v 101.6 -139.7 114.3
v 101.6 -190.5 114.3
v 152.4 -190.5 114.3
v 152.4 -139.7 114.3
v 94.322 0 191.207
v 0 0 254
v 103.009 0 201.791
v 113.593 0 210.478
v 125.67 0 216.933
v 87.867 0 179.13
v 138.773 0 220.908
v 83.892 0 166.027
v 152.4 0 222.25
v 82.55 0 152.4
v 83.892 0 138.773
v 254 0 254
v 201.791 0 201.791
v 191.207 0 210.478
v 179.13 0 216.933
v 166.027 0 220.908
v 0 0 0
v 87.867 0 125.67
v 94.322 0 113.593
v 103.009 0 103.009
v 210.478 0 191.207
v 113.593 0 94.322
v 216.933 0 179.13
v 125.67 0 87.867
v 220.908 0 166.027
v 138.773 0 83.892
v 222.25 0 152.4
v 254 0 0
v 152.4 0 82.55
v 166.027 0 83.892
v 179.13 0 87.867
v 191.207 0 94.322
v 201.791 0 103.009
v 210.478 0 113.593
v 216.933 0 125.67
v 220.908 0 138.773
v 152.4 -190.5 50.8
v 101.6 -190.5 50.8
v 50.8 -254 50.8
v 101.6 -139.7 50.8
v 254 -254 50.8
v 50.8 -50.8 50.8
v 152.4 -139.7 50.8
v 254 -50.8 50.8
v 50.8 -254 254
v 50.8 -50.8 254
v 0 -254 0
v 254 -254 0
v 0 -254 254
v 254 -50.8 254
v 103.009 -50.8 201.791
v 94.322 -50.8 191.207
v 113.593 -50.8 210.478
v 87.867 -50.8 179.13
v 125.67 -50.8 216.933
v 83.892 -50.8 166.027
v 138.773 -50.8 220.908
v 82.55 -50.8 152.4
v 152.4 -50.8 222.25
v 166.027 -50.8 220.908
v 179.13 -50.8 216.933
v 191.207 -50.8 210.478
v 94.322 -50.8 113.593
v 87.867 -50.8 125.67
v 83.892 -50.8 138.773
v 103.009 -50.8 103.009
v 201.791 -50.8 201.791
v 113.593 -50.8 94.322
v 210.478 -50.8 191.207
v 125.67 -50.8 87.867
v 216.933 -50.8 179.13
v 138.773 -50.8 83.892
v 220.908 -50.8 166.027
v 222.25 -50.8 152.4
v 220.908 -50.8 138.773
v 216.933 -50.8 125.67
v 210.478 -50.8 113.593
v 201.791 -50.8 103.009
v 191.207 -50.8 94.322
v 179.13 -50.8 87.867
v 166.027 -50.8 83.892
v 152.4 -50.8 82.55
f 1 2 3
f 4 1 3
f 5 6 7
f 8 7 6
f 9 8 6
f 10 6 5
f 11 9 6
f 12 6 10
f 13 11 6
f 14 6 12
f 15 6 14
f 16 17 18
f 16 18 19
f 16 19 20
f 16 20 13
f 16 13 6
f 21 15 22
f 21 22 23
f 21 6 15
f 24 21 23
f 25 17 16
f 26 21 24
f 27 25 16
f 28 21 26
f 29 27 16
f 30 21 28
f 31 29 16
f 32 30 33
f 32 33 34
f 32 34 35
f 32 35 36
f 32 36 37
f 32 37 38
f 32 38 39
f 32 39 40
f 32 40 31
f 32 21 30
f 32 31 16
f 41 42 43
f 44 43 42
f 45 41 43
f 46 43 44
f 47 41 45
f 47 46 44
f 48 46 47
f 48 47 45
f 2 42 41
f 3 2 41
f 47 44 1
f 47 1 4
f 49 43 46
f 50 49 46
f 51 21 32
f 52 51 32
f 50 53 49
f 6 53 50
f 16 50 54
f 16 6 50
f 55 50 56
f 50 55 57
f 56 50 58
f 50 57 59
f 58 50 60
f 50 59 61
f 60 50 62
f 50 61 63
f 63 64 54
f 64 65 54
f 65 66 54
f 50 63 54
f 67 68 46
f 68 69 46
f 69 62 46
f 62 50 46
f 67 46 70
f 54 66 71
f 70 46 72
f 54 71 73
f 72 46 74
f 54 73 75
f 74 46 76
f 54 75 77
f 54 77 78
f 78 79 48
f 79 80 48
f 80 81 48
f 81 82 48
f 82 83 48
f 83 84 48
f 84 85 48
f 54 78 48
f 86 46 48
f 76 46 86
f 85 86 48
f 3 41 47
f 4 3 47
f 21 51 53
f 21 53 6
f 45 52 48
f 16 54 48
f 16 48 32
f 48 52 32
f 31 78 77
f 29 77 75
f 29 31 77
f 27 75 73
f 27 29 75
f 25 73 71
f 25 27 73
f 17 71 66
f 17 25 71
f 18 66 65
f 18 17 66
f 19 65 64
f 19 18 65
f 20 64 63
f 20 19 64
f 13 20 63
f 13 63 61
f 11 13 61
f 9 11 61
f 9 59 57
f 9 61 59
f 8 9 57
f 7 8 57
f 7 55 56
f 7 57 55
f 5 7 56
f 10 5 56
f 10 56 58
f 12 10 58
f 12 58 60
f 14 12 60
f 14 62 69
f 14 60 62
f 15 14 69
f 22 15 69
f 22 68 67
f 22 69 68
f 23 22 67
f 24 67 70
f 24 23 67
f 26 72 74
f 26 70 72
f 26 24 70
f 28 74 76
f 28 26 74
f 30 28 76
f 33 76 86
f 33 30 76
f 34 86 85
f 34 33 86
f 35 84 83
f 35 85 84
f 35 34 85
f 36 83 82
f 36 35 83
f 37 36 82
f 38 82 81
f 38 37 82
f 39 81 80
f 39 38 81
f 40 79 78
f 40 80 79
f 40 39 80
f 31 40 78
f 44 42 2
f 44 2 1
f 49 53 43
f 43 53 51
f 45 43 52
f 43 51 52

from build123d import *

# Parameters (mm, degrees)
F0_W     = 254
F0_H     = 254
F1_DEPTH = 254
F4_T     = -50.8
F5_R     = 69.85
F6_DEPTH = 254.001
F7_W     = 50.8
F7_H     = 50.8
F8_DEPTH = 114.3


with BuildPart() as f1:
    # F0 (on Top) → F1 (new body)
    with BuildSketch(Plane.XY):
        with Locations((127, -127)):
            Rectangle(F0_W, F0_H)
    extrude(amount=F1_DEPTH)

    # F4
    f4_openings = [f1.faces().sort_by_distance(p)[0] for p in [
        (127, -254, 127),
        (254, -127, 127),
        (127, -127, 254),
    ]]
    offset(amount=F4_T, openings=f4_openings)

    # F5 (on Front) → F6 (cut, through all)
    with BuildSketch(Plane.XZ):
        with Locations((152.4, 152.4)):
            Circle(F5_R)
    extrude(amount=F6_DEPTH, mode=Mode.SUBTRACT)

    # F7 (on Top) → F8 (join)
    with BuildSketch(Plane.XY):
        with Locations((127, -165.1)):
            Rectangle(F7_W, F7_H)
    extrude(amount=F8_DEPTH)


solid = f1.part
